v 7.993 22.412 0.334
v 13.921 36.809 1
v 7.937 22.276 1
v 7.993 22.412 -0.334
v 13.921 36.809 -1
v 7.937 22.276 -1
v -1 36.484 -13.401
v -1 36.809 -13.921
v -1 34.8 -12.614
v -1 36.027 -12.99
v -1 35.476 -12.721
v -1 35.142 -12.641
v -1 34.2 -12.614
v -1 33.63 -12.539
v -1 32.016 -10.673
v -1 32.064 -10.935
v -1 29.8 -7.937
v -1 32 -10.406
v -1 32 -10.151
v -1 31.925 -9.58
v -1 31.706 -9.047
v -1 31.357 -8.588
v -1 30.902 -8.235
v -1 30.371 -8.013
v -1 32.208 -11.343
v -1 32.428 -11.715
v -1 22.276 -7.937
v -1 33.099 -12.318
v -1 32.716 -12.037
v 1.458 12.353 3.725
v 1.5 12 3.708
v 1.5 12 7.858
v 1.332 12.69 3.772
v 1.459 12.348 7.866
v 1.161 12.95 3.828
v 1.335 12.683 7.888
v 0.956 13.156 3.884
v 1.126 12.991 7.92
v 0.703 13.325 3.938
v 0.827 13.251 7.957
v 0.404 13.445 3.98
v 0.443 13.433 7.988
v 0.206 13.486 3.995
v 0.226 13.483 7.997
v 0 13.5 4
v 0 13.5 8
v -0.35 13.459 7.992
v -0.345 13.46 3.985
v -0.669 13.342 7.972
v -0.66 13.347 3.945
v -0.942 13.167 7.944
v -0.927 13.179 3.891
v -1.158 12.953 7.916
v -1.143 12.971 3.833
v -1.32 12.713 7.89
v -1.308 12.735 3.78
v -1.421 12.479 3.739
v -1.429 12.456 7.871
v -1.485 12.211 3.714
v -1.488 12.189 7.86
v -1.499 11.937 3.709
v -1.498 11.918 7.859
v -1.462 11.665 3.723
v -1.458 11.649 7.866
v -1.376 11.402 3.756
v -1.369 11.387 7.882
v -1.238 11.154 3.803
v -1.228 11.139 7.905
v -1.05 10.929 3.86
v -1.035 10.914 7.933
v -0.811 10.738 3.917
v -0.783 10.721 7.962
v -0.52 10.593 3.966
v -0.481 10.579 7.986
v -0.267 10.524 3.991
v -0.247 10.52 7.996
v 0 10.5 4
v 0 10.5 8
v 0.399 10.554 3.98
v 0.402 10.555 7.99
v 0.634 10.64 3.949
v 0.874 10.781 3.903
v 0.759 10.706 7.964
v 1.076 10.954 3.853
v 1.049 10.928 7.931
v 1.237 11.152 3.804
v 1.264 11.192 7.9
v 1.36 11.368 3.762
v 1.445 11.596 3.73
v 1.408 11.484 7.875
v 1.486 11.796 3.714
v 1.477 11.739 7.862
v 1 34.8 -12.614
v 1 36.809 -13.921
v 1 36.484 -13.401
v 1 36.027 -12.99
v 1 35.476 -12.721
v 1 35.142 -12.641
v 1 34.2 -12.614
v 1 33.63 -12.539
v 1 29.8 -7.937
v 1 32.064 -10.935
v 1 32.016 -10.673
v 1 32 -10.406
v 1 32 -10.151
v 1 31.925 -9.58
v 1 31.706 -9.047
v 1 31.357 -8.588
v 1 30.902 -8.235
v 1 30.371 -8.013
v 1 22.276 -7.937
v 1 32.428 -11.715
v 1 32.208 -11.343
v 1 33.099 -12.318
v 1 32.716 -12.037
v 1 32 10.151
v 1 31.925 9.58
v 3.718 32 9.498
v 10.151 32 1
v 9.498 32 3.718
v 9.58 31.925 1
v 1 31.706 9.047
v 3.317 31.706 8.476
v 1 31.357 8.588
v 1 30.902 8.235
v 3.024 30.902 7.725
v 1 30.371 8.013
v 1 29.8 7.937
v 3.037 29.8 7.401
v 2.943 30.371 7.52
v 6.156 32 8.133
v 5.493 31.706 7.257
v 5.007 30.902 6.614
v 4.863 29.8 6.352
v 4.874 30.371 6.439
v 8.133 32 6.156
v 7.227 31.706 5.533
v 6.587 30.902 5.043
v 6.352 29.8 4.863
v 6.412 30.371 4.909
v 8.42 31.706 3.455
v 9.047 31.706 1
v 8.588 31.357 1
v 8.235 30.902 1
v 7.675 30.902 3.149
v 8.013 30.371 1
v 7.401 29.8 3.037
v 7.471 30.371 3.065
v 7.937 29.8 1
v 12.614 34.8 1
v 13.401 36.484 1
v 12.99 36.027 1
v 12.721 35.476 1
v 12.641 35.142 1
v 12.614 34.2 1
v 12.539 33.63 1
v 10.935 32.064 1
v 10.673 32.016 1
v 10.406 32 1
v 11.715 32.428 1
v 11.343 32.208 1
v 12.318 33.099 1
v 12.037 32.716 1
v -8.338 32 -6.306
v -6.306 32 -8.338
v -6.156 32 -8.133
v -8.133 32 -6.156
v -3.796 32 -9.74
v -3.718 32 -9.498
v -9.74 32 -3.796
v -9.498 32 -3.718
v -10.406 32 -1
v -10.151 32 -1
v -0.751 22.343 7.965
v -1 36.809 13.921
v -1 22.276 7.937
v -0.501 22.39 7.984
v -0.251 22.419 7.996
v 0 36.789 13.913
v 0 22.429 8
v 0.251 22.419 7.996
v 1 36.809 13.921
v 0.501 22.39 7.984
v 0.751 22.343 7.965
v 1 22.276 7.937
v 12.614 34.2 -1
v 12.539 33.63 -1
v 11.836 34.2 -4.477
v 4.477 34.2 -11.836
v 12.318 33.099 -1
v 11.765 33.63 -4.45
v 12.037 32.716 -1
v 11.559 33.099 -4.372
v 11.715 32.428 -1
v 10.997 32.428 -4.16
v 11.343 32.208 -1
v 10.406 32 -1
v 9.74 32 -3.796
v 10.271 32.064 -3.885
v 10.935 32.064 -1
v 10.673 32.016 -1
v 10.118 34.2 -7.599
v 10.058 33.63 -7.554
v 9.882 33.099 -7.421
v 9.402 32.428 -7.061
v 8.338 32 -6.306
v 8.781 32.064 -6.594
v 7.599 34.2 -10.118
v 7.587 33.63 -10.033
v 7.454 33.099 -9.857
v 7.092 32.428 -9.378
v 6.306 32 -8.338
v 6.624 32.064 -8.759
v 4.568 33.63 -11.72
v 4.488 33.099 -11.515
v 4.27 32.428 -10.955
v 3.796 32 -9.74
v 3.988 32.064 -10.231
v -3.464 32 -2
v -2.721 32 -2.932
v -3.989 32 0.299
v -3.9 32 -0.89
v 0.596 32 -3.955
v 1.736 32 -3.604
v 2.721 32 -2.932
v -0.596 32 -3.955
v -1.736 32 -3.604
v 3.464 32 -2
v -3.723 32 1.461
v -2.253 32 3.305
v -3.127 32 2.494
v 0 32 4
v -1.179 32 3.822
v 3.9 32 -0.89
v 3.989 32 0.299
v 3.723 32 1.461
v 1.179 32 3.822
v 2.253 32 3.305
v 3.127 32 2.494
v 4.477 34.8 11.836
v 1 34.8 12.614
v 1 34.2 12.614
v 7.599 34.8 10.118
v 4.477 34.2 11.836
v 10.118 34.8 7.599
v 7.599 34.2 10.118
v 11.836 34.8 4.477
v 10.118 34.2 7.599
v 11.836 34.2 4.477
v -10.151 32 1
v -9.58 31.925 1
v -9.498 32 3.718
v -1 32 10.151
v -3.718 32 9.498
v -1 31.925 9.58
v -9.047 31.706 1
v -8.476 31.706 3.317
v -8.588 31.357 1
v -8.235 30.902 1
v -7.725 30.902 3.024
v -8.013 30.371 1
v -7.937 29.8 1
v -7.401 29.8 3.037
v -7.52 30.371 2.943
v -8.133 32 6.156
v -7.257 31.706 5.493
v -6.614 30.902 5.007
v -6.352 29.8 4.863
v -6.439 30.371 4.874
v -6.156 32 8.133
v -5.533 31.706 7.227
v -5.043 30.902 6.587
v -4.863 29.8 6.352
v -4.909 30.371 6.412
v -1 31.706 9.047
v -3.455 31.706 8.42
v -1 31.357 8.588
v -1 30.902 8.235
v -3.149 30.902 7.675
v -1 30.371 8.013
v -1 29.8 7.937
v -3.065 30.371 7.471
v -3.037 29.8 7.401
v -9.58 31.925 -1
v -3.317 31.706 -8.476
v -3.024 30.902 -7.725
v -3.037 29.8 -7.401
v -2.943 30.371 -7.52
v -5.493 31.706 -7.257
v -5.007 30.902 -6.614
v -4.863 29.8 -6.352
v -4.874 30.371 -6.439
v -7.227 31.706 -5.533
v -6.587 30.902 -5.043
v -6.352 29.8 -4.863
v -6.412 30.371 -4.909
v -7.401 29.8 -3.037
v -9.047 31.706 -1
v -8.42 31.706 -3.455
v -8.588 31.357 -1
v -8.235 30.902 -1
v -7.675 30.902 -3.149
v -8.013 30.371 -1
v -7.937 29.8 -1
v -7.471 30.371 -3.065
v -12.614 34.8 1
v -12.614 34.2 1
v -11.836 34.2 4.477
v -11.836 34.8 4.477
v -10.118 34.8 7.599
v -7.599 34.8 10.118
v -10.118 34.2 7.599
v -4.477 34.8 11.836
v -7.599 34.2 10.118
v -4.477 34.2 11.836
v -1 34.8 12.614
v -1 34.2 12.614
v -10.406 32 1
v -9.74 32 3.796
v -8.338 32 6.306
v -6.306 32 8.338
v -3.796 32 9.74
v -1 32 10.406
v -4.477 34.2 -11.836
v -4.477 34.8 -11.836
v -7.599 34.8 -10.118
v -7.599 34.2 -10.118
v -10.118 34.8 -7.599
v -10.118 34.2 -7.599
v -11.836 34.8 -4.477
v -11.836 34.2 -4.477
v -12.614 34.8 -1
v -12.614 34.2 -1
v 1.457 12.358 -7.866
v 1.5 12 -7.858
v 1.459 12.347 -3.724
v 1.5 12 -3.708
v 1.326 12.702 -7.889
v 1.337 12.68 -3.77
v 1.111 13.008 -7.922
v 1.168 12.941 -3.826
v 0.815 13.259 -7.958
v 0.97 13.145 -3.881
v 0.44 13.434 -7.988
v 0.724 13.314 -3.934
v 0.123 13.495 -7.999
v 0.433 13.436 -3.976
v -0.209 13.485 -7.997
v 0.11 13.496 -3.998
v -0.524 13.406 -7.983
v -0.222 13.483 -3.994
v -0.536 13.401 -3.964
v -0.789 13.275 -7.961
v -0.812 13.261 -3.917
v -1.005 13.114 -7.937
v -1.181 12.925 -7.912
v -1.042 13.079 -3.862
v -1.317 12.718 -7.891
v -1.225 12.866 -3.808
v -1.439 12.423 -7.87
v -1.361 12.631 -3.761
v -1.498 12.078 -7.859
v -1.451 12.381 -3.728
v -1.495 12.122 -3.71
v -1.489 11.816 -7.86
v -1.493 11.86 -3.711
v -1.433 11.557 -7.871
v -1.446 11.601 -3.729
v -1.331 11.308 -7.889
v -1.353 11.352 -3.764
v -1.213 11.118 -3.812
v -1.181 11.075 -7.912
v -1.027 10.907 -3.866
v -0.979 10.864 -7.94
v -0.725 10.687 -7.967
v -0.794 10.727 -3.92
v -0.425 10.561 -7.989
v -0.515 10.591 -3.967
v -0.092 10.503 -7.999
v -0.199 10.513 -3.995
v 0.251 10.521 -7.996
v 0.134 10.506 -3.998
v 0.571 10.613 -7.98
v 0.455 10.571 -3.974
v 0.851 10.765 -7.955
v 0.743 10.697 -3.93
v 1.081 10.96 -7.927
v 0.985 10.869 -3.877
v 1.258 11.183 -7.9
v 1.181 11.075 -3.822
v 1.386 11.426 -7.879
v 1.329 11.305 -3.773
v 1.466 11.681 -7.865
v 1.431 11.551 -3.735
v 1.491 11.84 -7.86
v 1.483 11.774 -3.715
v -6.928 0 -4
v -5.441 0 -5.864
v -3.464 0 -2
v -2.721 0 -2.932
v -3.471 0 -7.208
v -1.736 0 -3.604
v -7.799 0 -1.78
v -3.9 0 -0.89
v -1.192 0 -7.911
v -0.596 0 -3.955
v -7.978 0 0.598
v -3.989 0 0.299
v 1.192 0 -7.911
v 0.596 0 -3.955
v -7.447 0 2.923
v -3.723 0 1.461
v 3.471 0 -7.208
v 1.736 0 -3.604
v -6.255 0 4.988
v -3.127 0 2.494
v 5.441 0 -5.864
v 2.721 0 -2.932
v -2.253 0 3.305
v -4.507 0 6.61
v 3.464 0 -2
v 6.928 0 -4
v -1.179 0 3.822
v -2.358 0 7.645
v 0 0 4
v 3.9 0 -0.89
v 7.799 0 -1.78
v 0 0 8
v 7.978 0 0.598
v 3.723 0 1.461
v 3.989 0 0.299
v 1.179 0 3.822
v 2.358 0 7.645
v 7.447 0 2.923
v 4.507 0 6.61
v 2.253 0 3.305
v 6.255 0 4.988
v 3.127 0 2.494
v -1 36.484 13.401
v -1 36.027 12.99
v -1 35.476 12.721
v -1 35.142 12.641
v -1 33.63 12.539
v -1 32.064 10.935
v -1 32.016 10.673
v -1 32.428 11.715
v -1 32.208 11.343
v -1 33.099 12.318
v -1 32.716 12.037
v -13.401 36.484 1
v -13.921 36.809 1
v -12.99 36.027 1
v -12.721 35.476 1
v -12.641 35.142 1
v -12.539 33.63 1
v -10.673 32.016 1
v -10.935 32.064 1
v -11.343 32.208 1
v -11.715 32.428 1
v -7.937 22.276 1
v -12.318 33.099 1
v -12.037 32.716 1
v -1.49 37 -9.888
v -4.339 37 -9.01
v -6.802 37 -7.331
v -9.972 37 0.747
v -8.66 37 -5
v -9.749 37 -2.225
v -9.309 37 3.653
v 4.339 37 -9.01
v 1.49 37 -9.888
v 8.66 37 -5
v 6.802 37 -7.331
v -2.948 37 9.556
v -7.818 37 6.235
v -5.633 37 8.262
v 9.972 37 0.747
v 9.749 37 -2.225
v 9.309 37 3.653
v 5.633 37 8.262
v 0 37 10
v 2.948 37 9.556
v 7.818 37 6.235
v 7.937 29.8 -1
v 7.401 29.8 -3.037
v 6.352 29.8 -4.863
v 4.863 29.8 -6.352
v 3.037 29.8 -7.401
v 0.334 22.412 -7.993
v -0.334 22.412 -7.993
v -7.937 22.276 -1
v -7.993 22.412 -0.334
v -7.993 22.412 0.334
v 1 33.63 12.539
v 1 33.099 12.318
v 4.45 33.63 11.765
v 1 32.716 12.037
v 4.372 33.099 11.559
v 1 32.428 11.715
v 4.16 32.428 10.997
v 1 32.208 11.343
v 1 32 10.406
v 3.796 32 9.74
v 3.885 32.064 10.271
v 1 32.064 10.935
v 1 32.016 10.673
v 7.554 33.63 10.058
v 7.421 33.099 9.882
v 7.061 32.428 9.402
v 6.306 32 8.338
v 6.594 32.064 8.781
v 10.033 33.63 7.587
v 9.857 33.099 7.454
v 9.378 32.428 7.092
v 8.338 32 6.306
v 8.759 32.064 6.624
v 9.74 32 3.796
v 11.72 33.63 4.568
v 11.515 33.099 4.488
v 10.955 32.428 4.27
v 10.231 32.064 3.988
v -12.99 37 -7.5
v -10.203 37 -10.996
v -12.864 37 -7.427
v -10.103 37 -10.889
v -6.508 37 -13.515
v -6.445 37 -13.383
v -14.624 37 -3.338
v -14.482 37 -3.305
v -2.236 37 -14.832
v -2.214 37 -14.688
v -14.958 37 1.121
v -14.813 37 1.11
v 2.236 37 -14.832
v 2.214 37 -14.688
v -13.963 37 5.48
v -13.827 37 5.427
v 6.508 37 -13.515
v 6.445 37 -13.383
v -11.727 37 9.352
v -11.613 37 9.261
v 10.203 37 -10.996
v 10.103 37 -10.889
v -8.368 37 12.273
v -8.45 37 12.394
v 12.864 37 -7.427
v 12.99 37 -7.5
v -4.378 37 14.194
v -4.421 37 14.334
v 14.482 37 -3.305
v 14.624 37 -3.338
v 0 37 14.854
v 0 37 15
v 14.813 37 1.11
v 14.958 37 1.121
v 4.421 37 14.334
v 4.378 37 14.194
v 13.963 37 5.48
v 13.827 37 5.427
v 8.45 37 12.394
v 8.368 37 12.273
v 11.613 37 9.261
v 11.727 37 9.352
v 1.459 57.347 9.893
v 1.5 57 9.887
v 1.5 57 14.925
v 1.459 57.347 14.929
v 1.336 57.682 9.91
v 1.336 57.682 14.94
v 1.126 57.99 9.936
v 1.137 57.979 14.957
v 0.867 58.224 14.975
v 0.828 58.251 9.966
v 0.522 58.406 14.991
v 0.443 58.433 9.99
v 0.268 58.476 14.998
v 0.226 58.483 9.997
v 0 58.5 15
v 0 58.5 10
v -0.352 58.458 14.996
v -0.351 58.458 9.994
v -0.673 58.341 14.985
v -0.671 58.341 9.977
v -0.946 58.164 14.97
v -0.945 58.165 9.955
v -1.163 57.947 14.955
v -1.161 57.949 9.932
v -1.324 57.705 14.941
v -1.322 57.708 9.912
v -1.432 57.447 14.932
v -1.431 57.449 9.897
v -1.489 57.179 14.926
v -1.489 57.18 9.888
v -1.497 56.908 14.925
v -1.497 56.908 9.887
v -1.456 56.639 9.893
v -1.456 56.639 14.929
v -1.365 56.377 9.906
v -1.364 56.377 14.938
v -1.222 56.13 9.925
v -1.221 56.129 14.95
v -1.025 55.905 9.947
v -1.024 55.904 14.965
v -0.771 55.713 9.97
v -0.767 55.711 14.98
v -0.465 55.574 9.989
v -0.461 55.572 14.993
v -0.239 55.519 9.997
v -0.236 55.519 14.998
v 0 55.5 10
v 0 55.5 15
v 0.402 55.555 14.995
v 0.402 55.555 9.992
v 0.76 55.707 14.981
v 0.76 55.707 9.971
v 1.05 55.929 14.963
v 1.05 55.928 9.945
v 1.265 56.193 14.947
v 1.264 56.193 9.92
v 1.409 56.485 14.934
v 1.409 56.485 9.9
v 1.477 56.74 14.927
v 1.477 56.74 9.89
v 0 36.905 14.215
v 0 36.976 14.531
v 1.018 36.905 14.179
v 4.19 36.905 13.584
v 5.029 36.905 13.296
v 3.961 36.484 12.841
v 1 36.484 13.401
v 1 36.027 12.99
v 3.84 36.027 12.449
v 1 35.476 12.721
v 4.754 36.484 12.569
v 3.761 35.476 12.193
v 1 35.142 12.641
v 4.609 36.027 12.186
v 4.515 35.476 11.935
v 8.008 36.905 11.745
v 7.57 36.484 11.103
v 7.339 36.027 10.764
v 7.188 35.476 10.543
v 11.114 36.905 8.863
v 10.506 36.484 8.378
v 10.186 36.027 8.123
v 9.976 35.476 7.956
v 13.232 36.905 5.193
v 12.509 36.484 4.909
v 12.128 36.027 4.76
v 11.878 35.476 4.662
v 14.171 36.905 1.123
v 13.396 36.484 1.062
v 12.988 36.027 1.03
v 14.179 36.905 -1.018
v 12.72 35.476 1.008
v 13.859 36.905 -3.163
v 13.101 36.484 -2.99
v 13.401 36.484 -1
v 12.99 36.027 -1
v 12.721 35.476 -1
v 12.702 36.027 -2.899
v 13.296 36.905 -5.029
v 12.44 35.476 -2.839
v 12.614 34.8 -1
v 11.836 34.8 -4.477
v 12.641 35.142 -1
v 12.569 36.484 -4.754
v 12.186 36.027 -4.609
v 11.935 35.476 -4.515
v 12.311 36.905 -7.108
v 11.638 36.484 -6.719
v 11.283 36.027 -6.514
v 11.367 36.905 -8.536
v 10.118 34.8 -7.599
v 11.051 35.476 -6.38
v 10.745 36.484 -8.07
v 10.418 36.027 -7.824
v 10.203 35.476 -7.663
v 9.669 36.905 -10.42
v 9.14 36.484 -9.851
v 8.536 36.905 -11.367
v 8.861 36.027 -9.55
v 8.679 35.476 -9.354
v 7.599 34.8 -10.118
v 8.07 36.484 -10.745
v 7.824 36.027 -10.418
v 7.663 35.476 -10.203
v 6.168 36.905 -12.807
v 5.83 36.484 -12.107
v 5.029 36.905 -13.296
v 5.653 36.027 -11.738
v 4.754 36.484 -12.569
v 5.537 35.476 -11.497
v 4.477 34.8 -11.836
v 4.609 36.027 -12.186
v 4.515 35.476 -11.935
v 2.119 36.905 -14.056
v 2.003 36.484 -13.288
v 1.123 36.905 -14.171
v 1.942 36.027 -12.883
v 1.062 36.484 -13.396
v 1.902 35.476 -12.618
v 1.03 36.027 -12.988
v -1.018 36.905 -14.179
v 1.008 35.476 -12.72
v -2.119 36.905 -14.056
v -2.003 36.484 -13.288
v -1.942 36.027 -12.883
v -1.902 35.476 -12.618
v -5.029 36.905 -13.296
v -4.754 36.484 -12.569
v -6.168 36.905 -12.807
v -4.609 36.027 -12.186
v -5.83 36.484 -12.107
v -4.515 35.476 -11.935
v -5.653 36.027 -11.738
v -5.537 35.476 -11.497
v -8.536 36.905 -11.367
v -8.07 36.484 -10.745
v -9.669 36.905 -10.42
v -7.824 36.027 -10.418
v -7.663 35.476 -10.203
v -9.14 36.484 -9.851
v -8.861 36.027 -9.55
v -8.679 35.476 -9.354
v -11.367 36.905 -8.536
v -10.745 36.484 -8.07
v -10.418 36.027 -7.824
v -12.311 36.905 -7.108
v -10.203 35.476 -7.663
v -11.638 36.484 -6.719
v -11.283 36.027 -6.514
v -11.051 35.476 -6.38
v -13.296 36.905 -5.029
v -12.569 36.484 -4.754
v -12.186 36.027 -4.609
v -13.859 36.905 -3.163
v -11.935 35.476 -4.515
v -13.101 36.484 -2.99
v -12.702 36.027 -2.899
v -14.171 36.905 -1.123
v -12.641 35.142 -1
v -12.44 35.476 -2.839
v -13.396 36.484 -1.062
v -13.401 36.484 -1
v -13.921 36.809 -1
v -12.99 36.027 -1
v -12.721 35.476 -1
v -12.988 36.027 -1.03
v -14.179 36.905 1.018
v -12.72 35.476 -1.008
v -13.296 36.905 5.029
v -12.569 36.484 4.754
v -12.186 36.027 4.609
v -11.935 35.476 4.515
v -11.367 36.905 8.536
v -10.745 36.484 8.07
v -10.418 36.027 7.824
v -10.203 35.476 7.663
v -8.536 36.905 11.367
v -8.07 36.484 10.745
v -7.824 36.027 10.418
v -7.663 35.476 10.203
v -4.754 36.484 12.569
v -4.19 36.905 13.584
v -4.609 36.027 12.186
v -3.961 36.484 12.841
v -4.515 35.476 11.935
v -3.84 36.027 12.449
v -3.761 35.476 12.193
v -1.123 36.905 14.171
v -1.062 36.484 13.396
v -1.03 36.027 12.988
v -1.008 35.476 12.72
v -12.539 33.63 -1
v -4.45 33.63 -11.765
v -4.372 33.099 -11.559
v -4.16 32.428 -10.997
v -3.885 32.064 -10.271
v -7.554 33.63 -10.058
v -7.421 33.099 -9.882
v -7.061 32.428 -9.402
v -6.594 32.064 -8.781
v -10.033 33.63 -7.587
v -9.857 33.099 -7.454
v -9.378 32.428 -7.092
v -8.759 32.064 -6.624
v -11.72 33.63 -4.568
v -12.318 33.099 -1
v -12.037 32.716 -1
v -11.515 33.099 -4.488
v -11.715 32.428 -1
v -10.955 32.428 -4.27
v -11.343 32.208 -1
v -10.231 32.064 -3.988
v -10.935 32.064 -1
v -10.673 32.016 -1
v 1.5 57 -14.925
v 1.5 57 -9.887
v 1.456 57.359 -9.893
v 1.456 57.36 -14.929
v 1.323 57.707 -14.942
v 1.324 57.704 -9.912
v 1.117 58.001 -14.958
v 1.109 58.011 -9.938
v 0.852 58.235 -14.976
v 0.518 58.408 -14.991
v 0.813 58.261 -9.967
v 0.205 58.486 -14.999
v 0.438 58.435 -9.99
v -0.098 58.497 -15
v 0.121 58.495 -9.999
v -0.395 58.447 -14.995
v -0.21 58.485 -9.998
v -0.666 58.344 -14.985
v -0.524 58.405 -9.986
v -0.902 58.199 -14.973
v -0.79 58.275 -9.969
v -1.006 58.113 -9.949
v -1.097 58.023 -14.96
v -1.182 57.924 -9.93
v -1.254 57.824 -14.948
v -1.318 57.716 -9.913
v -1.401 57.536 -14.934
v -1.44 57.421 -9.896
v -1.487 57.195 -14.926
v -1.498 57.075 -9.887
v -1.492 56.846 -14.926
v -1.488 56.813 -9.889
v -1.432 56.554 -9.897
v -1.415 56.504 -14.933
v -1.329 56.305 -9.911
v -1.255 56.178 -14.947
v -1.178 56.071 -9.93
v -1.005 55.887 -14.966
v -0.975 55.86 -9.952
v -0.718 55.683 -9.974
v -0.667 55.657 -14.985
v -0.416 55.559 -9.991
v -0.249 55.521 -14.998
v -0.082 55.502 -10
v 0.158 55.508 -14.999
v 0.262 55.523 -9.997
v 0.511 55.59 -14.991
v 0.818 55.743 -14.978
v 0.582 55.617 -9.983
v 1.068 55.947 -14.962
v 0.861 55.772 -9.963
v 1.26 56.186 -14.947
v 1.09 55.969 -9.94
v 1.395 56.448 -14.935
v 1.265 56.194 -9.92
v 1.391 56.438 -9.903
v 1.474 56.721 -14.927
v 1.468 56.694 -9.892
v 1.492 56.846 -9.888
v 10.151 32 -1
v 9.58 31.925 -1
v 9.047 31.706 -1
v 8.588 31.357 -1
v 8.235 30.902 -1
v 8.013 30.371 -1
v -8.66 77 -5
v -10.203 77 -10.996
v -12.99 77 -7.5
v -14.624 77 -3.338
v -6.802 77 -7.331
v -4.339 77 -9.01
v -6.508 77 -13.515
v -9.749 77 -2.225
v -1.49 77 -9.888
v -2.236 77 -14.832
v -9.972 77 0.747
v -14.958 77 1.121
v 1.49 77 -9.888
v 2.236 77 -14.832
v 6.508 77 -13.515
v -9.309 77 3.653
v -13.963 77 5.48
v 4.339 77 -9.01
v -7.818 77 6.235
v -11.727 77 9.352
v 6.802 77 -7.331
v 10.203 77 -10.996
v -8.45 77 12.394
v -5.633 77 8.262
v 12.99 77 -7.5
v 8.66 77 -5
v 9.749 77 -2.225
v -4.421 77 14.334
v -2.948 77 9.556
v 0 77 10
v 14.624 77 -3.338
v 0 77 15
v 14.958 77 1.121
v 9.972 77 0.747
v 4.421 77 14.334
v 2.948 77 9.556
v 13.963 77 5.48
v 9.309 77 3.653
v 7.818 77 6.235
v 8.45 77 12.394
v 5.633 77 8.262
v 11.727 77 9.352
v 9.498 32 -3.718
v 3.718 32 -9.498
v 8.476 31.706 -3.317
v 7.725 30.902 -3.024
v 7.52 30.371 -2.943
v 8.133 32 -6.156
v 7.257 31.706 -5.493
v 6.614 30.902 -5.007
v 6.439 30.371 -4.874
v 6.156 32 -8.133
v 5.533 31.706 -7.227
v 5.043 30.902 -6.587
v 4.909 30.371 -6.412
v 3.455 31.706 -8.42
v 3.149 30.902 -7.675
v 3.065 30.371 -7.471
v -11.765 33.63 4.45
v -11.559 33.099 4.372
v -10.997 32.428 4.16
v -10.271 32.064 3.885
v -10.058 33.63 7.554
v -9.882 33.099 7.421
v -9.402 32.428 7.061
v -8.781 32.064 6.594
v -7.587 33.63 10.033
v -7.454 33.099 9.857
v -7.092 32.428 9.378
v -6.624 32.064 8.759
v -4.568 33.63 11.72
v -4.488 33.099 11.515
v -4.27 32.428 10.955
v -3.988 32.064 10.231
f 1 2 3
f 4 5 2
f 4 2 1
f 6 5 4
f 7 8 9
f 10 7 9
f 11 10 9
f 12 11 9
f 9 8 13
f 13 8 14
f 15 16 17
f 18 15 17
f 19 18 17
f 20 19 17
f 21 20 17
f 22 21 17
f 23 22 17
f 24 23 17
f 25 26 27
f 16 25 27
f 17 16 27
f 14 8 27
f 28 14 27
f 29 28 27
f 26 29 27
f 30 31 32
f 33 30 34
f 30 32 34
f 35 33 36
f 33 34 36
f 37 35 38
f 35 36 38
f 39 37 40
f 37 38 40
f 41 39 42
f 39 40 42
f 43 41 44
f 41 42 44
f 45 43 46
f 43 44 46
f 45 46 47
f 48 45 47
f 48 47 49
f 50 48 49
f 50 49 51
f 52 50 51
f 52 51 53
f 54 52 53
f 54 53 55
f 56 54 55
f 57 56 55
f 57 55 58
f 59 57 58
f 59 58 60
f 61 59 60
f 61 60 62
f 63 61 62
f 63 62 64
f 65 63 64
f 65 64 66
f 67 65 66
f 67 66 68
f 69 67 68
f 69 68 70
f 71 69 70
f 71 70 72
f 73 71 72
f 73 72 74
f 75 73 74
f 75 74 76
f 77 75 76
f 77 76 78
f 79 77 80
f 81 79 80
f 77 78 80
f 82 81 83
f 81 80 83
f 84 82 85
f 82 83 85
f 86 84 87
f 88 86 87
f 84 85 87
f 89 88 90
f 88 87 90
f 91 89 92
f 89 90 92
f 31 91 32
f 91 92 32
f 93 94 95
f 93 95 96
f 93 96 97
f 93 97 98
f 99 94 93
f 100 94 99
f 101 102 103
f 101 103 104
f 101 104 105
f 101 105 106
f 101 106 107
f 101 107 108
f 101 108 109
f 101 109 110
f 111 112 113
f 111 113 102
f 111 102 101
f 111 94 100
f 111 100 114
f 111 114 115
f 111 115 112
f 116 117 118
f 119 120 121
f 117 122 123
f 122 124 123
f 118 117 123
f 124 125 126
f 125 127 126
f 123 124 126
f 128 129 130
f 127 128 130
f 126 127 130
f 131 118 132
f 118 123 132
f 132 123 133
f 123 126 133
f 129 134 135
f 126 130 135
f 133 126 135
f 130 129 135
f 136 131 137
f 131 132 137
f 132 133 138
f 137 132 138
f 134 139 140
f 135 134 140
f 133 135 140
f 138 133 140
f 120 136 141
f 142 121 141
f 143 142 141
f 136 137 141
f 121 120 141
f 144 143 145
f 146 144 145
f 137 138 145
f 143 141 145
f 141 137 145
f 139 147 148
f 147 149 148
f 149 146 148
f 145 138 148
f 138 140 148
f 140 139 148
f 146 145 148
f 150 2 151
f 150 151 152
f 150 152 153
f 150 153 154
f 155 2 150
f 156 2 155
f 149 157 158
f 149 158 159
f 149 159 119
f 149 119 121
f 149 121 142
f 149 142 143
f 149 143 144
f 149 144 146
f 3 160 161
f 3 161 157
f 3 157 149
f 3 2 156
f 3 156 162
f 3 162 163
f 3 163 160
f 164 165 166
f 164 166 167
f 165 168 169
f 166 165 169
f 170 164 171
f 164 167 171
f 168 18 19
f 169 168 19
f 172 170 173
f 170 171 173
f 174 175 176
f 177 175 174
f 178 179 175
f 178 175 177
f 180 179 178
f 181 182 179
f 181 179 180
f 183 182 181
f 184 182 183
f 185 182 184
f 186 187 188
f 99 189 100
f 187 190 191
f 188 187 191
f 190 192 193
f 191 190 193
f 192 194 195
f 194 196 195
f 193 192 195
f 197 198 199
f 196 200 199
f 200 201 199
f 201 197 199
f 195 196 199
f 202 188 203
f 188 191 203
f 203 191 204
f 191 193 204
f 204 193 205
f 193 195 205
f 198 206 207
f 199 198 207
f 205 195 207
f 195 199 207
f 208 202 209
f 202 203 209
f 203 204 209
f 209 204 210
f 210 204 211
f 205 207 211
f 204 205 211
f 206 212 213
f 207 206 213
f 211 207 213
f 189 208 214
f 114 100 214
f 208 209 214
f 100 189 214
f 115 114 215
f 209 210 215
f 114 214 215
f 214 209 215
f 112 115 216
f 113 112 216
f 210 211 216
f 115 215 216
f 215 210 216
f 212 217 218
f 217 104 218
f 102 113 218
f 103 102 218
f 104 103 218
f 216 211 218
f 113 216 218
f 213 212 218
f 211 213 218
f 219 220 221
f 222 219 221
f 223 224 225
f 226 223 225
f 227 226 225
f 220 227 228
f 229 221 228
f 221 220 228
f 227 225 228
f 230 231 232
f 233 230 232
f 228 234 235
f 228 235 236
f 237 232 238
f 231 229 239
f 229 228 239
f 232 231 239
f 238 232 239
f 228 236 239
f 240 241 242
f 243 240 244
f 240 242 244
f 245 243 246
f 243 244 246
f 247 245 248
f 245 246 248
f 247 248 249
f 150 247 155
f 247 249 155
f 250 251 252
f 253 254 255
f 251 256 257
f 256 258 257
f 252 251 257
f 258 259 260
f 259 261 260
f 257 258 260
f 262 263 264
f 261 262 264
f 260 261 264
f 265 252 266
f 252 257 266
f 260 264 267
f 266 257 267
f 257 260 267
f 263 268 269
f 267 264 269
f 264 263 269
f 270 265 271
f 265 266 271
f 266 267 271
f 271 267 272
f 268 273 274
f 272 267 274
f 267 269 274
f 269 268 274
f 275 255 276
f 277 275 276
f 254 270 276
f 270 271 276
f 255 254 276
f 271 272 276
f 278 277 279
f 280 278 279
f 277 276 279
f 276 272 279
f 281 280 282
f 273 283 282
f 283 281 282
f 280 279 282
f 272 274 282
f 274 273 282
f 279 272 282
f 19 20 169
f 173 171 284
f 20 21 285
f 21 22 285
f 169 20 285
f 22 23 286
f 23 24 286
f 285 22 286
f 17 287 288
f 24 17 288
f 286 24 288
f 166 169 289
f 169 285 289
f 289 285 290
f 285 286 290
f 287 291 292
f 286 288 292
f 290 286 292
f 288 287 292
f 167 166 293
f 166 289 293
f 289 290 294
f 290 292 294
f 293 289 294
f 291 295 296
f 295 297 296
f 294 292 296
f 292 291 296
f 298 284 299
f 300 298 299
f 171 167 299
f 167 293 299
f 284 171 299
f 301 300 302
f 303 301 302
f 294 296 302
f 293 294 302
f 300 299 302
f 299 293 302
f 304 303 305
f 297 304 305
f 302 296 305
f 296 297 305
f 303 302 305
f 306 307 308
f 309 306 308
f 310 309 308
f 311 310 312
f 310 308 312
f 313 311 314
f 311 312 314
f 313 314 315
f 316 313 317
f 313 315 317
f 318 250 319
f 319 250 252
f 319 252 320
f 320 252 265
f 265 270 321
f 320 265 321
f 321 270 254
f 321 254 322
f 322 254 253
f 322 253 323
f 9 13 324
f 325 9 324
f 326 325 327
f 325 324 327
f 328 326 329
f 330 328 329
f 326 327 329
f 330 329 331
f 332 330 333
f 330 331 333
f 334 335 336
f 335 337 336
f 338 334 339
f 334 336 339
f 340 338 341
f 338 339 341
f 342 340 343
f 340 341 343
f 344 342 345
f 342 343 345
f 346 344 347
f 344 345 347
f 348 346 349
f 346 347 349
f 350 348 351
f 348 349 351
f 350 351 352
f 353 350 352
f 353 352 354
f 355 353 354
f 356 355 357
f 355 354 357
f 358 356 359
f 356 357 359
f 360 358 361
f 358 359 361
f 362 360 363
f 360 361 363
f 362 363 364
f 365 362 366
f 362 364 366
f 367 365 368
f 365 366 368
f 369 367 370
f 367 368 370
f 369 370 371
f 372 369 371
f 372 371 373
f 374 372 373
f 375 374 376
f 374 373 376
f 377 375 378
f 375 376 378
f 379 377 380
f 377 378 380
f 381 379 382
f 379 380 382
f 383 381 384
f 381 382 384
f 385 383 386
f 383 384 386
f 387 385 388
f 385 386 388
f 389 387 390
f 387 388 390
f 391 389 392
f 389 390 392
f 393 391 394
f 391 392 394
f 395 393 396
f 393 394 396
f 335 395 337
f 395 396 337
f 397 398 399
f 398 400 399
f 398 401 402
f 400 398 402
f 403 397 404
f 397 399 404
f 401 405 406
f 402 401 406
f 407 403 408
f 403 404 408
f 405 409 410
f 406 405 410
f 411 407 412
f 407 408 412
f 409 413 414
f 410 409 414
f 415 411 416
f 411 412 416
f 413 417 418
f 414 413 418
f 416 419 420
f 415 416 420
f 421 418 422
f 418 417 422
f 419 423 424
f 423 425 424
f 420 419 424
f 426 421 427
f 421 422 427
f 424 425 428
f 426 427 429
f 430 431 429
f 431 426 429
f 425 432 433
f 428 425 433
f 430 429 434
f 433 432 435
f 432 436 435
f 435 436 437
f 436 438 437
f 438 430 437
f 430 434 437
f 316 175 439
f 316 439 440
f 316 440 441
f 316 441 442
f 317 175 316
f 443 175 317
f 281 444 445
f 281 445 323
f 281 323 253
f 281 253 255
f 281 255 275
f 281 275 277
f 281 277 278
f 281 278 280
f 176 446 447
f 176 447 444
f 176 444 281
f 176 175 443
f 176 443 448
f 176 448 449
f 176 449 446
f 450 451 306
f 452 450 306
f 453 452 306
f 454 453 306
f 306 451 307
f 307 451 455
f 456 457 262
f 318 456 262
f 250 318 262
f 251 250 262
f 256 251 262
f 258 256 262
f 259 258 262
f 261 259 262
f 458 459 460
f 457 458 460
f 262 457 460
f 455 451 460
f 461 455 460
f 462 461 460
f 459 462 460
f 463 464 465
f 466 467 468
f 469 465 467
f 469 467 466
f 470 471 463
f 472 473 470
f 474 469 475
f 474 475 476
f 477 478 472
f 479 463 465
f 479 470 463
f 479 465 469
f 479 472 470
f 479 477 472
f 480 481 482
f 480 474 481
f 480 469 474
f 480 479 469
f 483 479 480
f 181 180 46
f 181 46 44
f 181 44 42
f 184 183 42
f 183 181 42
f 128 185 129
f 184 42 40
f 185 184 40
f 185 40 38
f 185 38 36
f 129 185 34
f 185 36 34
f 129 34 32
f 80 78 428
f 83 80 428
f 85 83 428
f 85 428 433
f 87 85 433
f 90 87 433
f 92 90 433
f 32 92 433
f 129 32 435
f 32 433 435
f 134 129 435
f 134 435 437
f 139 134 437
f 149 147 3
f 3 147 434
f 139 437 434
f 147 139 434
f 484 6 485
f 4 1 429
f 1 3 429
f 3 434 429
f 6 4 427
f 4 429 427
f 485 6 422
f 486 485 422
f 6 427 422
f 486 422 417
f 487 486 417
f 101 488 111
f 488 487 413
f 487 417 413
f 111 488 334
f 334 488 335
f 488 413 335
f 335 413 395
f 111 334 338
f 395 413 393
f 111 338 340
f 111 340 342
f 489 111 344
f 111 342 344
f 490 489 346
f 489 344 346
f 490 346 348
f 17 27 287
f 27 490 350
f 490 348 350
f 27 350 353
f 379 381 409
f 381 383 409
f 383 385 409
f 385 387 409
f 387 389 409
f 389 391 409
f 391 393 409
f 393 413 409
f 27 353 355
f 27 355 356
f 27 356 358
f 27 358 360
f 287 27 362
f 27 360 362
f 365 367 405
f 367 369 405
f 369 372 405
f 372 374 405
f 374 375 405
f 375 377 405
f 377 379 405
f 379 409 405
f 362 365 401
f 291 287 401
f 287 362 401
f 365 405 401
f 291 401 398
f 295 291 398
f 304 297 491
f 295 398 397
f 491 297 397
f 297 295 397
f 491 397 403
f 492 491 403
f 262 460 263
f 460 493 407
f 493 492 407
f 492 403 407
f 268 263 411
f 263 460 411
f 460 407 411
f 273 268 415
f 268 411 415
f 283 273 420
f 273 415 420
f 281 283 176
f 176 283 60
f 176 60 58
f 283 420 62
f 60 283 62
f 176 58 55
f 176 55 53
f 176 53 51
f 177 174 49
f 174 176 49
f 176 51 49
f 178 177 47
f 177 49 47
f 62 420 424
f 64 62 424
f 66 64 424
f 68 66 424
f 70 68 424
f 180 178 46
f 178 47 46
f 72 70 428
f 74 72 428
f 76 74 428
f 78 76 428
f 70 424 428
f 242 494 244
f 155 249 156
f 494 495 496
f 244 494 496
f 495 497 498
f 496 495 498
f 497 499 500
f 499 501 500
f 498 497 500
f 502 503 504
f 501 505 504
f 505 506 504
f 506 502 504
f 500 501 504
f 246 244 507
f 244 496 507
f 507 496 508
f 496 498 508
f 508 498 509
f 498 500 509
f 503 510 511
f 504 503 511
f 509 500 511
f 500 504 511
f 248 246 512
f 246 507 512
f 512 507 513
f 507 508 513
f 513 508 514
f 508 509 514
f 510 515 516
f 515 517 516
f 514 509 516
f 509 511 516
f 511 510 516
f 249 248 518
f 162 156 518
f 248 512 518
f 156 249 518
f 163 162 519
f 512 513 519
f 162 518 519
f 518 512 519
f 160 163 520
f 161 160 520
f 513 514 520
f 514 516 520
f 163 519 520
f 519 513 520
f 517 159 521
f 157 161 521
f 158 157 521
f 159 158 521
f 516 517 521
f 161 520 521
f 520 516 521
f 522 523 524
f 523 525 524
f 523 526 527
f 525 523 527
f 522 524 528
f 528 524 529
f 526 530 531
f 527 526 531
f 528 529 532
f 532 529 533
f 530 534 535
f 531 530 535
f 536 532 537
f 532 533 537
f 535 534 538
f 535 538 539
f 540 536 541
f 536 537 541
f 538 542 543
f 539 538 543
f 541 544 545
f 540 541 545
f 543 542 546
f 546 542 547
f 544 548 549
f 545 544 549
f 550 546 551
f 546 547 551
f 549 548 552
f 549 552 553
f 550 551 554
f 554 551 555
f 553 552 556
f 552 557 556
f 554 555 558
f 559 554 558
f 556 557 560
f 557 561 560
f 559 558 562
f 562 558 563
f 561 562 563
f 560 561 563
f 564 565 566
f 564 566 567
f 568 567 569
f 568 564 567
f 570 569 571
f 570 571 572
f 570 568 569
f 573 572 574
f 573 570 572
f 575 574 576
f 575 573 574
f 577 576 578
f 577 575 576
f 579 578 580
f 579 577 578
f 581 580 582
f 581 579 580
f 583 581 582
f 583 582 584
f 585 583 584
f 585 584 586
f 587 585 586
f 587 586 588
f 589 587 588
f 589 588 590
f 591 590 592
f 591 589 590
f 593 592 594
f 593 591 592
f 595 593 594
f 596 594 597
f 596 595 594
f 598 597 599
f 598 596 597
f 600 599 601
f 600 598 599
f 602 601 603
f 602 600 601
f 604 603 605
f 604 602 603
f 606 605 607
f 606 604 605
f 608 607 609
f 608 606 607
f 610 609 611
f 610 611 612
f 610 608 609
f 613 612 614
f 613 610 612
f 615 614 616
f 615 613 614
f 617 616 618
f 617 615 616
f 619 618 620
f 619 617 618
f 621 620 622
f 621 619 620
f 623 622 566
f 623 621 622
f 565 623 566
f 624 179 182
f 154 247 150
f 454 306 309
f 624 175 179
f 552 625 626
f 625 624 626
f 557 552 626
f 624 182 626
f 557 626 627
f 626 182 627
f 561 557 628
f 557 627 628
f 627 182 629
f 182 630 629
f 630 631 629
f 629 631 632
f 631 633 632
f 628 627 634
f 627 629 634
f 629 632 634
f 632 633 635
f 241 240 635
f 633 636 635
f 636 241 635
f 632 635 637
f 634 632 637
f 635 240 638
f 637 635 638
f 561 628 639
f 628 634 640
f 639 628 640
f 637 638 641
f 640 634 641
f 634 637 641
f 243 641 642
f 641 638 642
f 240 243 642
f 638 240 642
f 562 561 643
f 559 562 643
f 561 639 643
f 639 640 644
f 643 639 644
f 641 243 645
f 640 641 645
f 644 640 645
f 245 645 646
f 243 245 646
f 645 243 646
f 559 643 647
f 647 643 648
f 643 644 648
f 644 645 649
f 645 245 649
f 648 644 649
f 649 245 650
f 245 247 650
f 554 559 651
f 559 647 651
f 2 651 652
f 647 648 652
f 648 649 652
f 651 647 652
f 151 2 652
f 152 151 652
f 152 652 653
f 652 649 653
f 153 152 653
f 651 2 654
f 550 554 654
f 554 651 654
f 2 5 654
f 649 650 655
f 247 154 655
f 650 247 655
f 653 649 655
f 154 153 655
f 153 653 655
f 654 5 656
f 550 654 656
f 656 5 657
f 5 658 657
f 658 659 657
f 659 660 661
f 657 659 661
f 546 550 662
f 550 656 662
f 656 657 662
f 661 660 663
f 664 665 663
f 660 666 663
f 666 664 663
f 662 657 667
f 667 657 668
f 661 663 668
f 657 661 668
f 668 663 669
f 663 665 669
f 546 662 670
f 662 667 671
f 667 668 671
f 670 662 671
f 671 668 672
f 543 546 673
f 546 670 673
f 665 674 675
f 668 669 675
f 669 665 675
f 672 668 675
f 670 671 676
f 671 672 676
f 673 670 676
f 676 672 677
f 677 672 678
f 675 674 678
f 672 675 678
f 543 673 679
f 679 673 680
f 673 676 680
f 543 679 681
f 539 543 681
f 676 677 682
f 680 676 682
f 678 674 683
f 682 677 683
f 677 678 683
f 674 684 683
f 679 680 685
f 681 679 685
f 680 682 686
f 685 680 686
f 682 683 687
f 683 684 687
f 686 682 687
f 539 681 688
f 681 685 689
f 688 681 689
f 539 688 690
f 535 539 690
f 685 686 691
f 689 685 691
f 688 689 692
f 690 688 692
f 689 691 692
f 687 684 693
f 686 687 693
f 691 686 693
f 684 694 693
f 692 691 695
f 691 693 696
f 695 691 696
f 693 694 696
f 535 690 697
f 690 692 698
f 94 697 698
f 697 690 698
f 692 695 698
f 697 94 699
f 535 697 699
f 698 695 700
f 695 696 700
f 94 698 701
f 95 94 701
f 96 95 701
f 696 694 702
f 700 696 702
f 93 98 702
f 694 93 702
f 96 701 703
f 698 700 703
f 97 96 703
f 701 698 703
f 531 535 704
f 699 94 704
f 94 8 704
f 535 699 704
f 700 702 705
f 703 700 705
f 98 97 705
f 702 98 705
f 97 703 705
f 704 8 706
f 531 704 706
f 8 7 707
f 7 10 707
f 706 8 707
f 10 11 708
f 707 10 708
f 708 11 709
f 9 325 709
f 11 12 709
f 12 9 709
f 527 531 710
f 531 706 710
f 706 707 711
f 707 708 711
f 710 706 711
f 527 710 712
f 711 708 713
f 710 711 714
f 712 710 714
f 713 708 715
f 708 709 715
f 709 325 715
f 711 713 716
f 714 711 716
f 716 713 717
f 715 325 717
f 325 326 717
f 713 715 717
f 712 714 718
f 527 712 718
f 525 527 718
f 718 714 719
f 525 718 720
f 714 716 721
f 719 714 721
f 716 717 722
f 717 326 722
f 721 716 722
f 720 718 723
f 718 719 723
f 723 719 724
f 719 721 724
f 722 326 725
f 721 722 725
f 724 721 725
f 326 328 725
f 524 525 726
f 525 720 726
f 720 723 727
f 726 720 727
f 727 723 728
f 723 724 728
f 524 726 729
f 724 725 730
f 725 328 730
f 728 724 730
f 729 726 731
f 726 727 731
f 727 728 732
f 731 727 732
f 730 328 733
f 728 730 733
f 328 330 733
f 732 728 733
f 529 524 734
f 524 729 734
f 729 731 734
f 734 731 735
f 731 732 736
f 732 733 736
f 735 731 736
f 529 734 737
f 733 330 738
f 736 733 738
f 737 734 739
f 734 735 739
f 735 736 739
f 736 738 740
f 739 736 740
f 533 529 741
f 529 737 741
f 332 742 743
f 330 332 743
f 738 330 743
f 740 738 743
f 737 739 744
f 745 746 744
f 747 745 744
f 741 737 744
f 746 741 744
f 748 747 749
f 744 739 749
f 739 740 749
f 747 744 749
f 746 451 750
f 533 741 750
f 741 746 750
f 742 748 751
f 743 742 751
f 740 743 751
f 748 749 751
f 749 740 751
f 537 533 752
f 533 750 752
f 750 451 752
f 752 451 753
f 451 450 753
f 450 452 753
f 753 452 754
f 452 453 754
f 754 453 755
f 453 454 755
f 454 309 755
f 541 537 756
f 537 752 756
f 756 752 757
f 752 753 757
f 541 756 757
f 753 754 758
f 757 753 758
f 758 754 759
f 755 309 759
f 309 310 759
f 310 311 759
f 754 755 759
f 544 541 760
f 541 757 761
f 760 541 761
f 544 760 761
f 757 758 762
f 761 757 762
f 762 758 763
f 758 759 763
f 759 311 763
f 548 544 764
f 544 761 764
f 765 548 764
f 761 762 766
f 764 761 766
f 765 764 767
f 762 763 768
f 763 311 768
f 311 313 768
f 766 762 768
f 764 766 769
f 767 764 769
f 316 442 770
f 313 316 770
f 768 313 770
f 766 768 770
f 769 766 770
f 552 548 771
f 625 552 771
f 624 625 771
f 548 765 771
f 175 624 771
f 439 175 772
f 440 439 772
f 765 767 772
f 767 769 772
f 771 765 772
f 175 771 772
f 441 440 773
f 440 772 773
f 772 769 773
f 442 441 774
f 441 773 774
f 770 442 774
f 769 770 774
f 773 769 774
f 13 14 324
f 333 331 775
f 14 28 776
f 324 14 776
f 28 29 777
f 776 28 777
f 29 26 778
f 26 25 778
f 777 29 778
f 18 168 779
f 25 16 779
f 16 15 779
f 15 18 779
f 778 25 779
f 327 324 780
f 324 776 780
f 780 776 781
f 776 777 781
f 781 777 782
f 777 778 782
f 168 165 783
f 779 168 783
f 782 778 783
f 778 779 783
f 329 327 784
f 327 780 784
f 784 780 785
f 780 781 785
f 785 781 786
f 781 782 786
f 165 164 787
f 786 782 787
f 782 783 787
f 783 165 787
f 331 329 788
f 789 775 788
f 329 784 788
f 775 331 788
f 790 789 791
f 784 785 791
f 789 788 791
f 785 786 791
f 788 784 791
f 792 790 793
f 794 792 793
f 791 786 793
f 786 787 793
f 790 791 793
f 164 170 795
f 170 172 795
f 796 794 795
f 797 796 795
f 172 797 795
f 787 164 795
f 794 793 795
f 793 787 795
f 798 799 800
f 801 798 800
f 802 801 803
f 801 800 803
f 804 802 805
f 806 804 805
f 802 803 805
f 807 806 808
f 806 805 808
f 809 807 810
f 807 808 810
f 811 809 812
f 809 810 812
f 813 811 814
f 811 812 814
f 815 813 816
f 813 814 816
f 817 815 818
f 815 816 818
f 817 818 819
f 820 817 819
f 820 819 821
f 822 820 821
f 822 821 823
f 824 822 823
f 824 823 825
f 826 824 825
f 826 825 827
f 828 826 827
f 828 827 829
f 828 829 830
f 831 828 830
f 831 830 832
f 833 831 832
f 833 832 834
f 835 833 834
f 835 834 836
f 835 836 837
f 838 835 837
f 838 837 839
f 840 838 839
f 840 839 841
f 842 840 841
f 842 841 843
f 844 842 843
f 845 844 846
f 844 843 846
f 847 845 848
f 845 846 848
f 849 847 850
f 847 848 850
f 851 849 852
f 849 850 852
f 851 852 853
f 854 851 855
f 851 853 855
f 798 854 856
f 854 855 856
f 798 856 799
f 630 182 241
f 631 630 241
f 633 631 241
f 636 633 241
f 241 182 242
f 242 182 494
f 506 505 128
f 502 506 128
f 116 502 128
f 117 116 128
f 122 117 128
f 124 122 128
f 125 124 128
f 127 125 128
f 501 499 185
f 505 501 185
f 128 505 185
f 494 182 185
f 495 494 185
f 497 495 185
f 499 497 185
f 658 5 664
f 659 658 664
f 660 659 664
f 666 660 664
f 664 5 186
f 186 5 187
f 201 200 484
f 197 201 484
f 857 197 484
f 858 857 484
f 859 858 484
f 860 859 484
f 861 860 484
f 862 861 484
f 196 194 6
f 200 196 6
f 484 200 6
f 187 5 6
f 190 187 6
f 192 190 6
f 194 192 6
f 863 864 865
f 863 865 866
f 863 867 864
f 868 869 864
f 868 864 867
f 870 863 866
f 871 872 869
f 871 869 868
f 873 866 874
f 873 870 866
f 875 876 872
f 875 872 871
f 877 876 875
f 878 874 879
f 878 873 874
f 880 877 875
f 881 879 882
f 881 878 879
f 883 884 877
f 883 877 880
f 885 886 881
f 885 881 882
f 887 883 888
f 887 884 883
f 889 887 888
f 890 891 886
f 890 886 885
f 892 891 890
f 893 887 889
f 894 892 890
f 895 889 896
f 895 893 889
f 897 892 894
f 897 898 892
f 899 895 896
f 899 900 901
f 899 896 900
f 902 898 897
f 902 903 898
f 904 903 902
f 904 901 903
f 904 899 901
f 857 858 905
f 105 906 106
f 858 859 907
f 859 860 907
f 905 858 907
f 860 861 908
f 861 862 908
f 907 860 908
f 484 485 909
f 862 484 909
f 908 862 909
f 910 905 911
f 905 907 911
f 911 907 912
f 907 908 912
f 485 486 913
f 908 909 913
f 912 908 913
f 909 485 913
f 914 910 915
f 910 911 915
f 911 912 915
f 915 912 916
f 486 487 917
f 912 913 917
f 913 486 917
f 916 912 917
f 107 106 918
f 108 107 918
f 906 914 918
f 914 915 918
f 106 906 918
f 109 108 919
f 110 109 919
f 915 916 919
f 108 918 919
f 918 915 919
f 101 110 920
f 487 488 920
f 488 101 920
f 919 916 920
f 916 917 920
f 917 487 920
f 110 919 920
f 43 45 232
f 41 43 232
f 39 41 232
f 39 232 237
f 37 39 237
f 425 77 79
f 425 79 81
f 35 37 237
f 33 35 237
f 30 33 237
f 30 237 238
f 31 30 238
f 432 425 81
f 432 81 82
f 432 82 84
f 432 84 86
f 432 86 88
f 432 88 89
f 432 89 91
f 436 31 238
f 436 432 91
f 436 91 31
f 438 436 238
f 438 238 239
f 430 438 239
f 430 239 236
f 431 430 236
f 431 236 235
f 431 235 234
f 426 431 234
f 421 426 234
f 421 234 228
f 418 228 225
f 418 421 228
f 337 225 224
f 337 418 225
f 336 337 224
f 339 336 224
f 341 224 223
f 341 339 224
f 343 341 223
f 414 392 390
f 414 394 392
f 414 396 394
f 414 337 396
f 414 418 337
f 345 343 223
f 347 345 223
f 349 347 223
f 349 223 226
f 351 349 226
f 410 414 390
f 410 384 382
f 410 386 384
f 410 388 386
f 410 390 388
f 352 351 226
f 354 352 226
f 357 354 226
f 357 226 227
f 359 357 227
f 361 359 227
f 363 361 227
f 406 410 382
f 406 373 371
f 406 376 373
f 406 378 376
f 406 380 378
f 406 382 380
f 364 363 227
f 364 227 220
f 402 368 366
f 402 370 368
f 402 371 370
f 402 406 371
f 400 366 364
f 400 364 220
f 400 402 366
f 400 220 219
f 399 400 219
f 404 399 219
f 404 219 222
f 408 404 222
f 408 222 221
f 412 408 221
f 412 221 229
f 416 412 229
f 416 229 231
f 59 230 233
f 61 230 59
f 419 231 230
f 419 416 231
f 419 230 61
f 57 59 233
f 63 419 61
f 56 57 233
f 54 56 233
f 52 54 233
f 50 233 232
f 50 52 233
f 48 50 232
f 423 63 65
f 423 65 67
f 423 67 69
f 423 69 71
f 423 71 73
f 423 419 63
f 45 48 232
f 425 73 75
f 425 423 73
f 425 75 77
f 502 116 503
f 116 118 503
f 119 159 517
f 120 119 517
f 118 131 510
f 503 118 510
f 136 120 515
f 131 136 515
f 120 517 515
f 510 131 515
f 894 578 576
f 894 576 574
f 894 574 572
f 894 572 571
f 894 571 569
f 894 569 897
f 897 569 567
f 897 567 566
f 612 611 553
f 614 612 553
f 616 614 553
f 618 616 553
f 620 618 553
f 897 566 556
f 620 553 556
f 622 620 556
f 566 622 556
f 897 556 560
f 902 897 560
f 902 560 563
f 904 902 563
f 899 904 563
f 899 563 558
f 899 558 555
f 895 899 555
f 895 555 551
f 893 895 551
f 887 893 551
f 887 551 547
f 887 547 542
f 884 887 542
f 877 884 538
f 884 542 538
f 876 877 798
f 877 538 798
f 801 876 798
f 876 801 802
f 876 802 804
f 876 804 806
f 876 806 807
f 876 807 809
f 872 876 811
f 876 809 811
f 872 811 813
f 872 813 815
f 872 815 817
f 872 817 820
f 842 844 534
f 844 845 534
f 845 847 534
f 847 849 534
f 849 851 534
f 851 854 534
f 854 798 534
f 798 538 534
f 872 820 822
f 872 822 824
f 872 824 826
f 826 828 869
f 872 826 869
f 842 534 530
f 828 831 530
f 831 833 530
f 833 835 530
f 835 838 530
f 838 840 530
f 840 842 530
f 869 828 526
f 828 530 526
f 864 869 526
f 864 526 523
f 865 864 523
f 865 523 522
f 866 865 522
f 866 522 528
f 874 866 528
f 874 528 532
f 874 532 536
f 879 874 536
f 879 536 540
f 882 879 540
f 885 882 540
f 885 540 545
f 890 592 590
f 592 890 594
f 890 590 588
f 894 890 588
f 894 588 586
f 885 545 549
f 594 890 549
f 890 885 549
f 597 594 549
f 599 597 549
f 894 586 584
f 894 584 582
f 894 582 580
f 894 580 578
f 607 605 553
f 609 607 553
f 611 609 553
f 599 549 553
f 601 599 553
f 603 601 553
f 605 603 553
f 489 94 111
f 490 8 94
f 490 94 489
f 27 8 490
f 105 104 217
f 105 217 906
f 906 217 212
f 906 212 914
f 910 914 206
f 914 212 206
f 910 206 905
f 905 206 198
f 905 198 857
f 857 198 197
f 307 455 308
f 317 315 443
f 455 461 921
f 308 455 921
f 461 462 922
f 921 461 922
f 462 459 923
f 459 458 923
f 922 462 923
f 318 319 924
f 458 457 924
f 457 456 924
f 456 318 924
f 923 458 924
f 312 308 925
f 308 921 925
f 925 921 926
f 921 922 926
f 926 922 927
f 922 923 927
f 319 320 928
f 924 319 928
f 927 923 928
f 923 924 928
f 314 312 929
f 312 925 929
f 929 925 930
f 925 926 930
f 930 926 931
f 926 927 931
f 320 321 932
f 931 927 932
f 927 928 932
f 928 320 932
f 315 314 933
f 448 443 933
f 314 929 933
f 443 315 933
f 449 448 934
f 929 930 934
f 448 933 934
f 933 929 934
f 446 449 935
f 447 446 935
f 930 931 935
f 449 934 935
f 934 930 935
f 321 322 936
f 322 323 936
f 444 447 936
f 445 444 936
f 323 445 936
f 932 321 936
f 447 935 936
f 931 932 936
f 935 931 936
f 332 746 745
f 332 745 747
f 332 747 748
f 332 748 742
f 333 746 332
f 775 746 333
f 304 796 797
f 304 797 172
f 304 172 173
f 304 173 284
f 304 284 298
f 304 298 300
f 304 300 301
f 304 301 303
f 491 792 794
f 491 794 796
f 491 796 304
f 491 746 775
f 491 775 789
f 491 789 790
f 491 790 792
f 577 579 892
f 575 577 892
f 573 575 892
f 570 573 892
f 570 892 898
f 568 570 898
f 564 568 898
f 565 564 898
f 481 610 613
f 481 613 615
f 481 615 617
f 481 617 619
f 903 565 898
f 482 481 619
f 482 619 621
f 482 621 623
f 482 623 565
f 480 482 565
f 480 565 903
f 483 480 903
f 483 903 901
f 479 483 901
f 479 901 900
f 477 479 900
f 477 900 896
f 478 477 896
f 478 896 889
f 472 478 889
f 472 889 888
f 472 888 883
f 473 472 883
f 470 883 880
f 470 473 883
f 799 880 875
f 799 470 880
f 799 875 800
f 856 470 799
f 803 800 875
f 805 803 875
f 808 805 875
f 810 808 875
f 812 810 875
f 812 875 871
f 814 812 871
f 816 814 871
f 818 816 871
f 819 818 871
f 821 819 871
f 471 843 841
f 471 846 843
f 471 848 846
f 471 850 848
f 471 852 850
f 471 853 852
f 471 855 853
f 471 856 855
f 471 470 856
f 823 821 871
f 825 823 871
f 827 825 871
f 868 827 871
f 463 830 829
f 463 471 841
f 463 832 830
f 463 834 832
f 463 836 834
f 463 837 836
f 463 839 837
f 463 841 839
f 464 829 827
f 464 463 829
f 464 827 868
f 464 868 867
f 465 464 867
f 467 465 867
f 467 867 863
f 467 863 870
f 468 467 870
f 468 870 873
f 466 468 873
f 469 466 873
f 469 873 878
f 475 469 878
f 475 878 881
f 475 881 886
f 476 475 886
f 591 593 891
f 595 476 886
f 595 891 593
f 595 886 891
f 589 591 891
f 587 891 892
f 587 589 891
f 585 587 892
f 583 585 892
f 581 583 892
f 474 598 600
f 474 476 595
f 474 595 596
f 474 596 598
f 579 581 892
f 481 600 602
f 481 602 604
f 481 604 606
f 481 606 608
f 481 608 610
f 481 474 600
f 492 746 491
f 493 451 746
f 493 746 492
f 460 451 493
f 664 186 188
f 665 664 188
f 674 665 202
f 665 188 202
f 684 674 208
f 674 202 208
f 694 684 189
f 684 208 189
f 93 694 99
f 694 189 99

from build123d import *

# Parameters (mm, degrees)
SKETCH1_R           = 8
SKETCH1_R_2         = 4
BOSS_EXTRUDE1_DEPTH = 32
SKETCH2_R           = 12.654046274
BOSS_EXTRUDE2_DEPTH = 5
SKETCH3_R           = 15
SKETCH3_R_2         = 10
BOSS_EXTRUDE3_DEPTH = 40
FILLET1_R           = 2.2
SKETCH4_R           = 1.5
CUT_EXTRUDE1_DEPTH  = 20
RIB5_REACH          = 81.869
SKETCH5_WALL_W      = 180.122060892
SKETCH5_WALL_H      = 2
CIRPATTERN1_COUNT   = 4


with BuildPart() as part:
    # Sketch1 → Boss-Extrude1 (new body)
    with BuildSketch(Plane(origin=(0, 0, 0), x_dir=(1, 0, 0), z_dir=(0, 1, 0))):
        with Locations(Location((0, 0, 0), (0, 0, 270))):
            Circle(SKETCH1_R)
        with Locations(Location((0, 0, 0), (0, 0, 270))):
            Circle(SKETCH1_R_2, mode=Mode.SUBTRACT)
    extrude(amount=BOSS_EXTRUDE1_DEPTH)

    # Sketch2 → Boss-Extrude2 (add)
    with BuildSketch(Plane(origin=(0, 32, 0), x_dir=(1, 0, 0), z_dir=(0, 1, 0))):
        with Locations(Location((0, 0, 0), (0, 0, 270))):
            Circle(SKETCH2_R)
    extrude(amount=BOSS_EXTRUDE2_DEPTH)

    # Sketch3 → Boss-Extrude3 (add)
    with BuildSketch(Plane(origin=(0, 37, 0), x_dir=(1, 0, 0), z_dir=(0, 1, 0))):
        with Locations(Location((0, 0, 0), (0, 0, 270))):
            Circle(SKETCH3_R)
        with Locations(Location((0, 0, 0), (0, 0, 270))):
            Circle(SKETCH3_R_2, mode=Mode.SUBTRACT)
    extrude(amount=BOSS_EXTRUDE3_DEPTH)

    # Fillet1
    fillet1_edges = [part.edges().sort_by_distance(p)[0] for p in [
        (0, 37, -12.654046274),
        (0, 32, -8),
        (0, 32, -12.654046274),
    ]]
    fillet(fillet1_edges, radius=FILLET1_R)

    # Sketch4 → Cut-Extrude1 (cut, symmetric)
    with BuildSketch(Plane.XY):
        with Locations((0, 57)):
            Circle(SKETCH4_R)
        with Locations((0, 12)):
            Circle(SKETCH4_R)
    extrude(amount=CUT_EXTRUDE1_DEPTH, both=True, mode=Mode.SUBTRACT)

    # Sketch5 wall → Rib5 (add, up to next)
    with BuildSketch(Plane(origin=(10.5, 28.5, 0), x_dir=(-0.380749805254, -0.924678098475, 0), z_dir=(0.924678098475, -0.380749805254, 0)), mode=Mode.PRIVATE) as rib5_sk1:
        Rectangle(SKETCH5_WALL_W, SKETCH5_WALL_H)
    rib5_tool1 = extrude(rib5_sk1.sketch, amount=-RIB5_REACH, mode=Mode.PRIVATE) - part.part
    rib5 = rib5_tool1.solids().sort_by_distance((10.5, 28.5, 0))[0]
    add(rib5)

    # CirPattern1: Rib5 ×4 about axis
    cirpattern1_axis = Axis((0, 0, 0), (0, 1, 0))
    for i in range(1, CIRPATTERN1_COUNT):
        add(rib5.rotate(cirpattern1_axis, i * 360 / CIRPATTERN1_COUNT))


solid = part.part
